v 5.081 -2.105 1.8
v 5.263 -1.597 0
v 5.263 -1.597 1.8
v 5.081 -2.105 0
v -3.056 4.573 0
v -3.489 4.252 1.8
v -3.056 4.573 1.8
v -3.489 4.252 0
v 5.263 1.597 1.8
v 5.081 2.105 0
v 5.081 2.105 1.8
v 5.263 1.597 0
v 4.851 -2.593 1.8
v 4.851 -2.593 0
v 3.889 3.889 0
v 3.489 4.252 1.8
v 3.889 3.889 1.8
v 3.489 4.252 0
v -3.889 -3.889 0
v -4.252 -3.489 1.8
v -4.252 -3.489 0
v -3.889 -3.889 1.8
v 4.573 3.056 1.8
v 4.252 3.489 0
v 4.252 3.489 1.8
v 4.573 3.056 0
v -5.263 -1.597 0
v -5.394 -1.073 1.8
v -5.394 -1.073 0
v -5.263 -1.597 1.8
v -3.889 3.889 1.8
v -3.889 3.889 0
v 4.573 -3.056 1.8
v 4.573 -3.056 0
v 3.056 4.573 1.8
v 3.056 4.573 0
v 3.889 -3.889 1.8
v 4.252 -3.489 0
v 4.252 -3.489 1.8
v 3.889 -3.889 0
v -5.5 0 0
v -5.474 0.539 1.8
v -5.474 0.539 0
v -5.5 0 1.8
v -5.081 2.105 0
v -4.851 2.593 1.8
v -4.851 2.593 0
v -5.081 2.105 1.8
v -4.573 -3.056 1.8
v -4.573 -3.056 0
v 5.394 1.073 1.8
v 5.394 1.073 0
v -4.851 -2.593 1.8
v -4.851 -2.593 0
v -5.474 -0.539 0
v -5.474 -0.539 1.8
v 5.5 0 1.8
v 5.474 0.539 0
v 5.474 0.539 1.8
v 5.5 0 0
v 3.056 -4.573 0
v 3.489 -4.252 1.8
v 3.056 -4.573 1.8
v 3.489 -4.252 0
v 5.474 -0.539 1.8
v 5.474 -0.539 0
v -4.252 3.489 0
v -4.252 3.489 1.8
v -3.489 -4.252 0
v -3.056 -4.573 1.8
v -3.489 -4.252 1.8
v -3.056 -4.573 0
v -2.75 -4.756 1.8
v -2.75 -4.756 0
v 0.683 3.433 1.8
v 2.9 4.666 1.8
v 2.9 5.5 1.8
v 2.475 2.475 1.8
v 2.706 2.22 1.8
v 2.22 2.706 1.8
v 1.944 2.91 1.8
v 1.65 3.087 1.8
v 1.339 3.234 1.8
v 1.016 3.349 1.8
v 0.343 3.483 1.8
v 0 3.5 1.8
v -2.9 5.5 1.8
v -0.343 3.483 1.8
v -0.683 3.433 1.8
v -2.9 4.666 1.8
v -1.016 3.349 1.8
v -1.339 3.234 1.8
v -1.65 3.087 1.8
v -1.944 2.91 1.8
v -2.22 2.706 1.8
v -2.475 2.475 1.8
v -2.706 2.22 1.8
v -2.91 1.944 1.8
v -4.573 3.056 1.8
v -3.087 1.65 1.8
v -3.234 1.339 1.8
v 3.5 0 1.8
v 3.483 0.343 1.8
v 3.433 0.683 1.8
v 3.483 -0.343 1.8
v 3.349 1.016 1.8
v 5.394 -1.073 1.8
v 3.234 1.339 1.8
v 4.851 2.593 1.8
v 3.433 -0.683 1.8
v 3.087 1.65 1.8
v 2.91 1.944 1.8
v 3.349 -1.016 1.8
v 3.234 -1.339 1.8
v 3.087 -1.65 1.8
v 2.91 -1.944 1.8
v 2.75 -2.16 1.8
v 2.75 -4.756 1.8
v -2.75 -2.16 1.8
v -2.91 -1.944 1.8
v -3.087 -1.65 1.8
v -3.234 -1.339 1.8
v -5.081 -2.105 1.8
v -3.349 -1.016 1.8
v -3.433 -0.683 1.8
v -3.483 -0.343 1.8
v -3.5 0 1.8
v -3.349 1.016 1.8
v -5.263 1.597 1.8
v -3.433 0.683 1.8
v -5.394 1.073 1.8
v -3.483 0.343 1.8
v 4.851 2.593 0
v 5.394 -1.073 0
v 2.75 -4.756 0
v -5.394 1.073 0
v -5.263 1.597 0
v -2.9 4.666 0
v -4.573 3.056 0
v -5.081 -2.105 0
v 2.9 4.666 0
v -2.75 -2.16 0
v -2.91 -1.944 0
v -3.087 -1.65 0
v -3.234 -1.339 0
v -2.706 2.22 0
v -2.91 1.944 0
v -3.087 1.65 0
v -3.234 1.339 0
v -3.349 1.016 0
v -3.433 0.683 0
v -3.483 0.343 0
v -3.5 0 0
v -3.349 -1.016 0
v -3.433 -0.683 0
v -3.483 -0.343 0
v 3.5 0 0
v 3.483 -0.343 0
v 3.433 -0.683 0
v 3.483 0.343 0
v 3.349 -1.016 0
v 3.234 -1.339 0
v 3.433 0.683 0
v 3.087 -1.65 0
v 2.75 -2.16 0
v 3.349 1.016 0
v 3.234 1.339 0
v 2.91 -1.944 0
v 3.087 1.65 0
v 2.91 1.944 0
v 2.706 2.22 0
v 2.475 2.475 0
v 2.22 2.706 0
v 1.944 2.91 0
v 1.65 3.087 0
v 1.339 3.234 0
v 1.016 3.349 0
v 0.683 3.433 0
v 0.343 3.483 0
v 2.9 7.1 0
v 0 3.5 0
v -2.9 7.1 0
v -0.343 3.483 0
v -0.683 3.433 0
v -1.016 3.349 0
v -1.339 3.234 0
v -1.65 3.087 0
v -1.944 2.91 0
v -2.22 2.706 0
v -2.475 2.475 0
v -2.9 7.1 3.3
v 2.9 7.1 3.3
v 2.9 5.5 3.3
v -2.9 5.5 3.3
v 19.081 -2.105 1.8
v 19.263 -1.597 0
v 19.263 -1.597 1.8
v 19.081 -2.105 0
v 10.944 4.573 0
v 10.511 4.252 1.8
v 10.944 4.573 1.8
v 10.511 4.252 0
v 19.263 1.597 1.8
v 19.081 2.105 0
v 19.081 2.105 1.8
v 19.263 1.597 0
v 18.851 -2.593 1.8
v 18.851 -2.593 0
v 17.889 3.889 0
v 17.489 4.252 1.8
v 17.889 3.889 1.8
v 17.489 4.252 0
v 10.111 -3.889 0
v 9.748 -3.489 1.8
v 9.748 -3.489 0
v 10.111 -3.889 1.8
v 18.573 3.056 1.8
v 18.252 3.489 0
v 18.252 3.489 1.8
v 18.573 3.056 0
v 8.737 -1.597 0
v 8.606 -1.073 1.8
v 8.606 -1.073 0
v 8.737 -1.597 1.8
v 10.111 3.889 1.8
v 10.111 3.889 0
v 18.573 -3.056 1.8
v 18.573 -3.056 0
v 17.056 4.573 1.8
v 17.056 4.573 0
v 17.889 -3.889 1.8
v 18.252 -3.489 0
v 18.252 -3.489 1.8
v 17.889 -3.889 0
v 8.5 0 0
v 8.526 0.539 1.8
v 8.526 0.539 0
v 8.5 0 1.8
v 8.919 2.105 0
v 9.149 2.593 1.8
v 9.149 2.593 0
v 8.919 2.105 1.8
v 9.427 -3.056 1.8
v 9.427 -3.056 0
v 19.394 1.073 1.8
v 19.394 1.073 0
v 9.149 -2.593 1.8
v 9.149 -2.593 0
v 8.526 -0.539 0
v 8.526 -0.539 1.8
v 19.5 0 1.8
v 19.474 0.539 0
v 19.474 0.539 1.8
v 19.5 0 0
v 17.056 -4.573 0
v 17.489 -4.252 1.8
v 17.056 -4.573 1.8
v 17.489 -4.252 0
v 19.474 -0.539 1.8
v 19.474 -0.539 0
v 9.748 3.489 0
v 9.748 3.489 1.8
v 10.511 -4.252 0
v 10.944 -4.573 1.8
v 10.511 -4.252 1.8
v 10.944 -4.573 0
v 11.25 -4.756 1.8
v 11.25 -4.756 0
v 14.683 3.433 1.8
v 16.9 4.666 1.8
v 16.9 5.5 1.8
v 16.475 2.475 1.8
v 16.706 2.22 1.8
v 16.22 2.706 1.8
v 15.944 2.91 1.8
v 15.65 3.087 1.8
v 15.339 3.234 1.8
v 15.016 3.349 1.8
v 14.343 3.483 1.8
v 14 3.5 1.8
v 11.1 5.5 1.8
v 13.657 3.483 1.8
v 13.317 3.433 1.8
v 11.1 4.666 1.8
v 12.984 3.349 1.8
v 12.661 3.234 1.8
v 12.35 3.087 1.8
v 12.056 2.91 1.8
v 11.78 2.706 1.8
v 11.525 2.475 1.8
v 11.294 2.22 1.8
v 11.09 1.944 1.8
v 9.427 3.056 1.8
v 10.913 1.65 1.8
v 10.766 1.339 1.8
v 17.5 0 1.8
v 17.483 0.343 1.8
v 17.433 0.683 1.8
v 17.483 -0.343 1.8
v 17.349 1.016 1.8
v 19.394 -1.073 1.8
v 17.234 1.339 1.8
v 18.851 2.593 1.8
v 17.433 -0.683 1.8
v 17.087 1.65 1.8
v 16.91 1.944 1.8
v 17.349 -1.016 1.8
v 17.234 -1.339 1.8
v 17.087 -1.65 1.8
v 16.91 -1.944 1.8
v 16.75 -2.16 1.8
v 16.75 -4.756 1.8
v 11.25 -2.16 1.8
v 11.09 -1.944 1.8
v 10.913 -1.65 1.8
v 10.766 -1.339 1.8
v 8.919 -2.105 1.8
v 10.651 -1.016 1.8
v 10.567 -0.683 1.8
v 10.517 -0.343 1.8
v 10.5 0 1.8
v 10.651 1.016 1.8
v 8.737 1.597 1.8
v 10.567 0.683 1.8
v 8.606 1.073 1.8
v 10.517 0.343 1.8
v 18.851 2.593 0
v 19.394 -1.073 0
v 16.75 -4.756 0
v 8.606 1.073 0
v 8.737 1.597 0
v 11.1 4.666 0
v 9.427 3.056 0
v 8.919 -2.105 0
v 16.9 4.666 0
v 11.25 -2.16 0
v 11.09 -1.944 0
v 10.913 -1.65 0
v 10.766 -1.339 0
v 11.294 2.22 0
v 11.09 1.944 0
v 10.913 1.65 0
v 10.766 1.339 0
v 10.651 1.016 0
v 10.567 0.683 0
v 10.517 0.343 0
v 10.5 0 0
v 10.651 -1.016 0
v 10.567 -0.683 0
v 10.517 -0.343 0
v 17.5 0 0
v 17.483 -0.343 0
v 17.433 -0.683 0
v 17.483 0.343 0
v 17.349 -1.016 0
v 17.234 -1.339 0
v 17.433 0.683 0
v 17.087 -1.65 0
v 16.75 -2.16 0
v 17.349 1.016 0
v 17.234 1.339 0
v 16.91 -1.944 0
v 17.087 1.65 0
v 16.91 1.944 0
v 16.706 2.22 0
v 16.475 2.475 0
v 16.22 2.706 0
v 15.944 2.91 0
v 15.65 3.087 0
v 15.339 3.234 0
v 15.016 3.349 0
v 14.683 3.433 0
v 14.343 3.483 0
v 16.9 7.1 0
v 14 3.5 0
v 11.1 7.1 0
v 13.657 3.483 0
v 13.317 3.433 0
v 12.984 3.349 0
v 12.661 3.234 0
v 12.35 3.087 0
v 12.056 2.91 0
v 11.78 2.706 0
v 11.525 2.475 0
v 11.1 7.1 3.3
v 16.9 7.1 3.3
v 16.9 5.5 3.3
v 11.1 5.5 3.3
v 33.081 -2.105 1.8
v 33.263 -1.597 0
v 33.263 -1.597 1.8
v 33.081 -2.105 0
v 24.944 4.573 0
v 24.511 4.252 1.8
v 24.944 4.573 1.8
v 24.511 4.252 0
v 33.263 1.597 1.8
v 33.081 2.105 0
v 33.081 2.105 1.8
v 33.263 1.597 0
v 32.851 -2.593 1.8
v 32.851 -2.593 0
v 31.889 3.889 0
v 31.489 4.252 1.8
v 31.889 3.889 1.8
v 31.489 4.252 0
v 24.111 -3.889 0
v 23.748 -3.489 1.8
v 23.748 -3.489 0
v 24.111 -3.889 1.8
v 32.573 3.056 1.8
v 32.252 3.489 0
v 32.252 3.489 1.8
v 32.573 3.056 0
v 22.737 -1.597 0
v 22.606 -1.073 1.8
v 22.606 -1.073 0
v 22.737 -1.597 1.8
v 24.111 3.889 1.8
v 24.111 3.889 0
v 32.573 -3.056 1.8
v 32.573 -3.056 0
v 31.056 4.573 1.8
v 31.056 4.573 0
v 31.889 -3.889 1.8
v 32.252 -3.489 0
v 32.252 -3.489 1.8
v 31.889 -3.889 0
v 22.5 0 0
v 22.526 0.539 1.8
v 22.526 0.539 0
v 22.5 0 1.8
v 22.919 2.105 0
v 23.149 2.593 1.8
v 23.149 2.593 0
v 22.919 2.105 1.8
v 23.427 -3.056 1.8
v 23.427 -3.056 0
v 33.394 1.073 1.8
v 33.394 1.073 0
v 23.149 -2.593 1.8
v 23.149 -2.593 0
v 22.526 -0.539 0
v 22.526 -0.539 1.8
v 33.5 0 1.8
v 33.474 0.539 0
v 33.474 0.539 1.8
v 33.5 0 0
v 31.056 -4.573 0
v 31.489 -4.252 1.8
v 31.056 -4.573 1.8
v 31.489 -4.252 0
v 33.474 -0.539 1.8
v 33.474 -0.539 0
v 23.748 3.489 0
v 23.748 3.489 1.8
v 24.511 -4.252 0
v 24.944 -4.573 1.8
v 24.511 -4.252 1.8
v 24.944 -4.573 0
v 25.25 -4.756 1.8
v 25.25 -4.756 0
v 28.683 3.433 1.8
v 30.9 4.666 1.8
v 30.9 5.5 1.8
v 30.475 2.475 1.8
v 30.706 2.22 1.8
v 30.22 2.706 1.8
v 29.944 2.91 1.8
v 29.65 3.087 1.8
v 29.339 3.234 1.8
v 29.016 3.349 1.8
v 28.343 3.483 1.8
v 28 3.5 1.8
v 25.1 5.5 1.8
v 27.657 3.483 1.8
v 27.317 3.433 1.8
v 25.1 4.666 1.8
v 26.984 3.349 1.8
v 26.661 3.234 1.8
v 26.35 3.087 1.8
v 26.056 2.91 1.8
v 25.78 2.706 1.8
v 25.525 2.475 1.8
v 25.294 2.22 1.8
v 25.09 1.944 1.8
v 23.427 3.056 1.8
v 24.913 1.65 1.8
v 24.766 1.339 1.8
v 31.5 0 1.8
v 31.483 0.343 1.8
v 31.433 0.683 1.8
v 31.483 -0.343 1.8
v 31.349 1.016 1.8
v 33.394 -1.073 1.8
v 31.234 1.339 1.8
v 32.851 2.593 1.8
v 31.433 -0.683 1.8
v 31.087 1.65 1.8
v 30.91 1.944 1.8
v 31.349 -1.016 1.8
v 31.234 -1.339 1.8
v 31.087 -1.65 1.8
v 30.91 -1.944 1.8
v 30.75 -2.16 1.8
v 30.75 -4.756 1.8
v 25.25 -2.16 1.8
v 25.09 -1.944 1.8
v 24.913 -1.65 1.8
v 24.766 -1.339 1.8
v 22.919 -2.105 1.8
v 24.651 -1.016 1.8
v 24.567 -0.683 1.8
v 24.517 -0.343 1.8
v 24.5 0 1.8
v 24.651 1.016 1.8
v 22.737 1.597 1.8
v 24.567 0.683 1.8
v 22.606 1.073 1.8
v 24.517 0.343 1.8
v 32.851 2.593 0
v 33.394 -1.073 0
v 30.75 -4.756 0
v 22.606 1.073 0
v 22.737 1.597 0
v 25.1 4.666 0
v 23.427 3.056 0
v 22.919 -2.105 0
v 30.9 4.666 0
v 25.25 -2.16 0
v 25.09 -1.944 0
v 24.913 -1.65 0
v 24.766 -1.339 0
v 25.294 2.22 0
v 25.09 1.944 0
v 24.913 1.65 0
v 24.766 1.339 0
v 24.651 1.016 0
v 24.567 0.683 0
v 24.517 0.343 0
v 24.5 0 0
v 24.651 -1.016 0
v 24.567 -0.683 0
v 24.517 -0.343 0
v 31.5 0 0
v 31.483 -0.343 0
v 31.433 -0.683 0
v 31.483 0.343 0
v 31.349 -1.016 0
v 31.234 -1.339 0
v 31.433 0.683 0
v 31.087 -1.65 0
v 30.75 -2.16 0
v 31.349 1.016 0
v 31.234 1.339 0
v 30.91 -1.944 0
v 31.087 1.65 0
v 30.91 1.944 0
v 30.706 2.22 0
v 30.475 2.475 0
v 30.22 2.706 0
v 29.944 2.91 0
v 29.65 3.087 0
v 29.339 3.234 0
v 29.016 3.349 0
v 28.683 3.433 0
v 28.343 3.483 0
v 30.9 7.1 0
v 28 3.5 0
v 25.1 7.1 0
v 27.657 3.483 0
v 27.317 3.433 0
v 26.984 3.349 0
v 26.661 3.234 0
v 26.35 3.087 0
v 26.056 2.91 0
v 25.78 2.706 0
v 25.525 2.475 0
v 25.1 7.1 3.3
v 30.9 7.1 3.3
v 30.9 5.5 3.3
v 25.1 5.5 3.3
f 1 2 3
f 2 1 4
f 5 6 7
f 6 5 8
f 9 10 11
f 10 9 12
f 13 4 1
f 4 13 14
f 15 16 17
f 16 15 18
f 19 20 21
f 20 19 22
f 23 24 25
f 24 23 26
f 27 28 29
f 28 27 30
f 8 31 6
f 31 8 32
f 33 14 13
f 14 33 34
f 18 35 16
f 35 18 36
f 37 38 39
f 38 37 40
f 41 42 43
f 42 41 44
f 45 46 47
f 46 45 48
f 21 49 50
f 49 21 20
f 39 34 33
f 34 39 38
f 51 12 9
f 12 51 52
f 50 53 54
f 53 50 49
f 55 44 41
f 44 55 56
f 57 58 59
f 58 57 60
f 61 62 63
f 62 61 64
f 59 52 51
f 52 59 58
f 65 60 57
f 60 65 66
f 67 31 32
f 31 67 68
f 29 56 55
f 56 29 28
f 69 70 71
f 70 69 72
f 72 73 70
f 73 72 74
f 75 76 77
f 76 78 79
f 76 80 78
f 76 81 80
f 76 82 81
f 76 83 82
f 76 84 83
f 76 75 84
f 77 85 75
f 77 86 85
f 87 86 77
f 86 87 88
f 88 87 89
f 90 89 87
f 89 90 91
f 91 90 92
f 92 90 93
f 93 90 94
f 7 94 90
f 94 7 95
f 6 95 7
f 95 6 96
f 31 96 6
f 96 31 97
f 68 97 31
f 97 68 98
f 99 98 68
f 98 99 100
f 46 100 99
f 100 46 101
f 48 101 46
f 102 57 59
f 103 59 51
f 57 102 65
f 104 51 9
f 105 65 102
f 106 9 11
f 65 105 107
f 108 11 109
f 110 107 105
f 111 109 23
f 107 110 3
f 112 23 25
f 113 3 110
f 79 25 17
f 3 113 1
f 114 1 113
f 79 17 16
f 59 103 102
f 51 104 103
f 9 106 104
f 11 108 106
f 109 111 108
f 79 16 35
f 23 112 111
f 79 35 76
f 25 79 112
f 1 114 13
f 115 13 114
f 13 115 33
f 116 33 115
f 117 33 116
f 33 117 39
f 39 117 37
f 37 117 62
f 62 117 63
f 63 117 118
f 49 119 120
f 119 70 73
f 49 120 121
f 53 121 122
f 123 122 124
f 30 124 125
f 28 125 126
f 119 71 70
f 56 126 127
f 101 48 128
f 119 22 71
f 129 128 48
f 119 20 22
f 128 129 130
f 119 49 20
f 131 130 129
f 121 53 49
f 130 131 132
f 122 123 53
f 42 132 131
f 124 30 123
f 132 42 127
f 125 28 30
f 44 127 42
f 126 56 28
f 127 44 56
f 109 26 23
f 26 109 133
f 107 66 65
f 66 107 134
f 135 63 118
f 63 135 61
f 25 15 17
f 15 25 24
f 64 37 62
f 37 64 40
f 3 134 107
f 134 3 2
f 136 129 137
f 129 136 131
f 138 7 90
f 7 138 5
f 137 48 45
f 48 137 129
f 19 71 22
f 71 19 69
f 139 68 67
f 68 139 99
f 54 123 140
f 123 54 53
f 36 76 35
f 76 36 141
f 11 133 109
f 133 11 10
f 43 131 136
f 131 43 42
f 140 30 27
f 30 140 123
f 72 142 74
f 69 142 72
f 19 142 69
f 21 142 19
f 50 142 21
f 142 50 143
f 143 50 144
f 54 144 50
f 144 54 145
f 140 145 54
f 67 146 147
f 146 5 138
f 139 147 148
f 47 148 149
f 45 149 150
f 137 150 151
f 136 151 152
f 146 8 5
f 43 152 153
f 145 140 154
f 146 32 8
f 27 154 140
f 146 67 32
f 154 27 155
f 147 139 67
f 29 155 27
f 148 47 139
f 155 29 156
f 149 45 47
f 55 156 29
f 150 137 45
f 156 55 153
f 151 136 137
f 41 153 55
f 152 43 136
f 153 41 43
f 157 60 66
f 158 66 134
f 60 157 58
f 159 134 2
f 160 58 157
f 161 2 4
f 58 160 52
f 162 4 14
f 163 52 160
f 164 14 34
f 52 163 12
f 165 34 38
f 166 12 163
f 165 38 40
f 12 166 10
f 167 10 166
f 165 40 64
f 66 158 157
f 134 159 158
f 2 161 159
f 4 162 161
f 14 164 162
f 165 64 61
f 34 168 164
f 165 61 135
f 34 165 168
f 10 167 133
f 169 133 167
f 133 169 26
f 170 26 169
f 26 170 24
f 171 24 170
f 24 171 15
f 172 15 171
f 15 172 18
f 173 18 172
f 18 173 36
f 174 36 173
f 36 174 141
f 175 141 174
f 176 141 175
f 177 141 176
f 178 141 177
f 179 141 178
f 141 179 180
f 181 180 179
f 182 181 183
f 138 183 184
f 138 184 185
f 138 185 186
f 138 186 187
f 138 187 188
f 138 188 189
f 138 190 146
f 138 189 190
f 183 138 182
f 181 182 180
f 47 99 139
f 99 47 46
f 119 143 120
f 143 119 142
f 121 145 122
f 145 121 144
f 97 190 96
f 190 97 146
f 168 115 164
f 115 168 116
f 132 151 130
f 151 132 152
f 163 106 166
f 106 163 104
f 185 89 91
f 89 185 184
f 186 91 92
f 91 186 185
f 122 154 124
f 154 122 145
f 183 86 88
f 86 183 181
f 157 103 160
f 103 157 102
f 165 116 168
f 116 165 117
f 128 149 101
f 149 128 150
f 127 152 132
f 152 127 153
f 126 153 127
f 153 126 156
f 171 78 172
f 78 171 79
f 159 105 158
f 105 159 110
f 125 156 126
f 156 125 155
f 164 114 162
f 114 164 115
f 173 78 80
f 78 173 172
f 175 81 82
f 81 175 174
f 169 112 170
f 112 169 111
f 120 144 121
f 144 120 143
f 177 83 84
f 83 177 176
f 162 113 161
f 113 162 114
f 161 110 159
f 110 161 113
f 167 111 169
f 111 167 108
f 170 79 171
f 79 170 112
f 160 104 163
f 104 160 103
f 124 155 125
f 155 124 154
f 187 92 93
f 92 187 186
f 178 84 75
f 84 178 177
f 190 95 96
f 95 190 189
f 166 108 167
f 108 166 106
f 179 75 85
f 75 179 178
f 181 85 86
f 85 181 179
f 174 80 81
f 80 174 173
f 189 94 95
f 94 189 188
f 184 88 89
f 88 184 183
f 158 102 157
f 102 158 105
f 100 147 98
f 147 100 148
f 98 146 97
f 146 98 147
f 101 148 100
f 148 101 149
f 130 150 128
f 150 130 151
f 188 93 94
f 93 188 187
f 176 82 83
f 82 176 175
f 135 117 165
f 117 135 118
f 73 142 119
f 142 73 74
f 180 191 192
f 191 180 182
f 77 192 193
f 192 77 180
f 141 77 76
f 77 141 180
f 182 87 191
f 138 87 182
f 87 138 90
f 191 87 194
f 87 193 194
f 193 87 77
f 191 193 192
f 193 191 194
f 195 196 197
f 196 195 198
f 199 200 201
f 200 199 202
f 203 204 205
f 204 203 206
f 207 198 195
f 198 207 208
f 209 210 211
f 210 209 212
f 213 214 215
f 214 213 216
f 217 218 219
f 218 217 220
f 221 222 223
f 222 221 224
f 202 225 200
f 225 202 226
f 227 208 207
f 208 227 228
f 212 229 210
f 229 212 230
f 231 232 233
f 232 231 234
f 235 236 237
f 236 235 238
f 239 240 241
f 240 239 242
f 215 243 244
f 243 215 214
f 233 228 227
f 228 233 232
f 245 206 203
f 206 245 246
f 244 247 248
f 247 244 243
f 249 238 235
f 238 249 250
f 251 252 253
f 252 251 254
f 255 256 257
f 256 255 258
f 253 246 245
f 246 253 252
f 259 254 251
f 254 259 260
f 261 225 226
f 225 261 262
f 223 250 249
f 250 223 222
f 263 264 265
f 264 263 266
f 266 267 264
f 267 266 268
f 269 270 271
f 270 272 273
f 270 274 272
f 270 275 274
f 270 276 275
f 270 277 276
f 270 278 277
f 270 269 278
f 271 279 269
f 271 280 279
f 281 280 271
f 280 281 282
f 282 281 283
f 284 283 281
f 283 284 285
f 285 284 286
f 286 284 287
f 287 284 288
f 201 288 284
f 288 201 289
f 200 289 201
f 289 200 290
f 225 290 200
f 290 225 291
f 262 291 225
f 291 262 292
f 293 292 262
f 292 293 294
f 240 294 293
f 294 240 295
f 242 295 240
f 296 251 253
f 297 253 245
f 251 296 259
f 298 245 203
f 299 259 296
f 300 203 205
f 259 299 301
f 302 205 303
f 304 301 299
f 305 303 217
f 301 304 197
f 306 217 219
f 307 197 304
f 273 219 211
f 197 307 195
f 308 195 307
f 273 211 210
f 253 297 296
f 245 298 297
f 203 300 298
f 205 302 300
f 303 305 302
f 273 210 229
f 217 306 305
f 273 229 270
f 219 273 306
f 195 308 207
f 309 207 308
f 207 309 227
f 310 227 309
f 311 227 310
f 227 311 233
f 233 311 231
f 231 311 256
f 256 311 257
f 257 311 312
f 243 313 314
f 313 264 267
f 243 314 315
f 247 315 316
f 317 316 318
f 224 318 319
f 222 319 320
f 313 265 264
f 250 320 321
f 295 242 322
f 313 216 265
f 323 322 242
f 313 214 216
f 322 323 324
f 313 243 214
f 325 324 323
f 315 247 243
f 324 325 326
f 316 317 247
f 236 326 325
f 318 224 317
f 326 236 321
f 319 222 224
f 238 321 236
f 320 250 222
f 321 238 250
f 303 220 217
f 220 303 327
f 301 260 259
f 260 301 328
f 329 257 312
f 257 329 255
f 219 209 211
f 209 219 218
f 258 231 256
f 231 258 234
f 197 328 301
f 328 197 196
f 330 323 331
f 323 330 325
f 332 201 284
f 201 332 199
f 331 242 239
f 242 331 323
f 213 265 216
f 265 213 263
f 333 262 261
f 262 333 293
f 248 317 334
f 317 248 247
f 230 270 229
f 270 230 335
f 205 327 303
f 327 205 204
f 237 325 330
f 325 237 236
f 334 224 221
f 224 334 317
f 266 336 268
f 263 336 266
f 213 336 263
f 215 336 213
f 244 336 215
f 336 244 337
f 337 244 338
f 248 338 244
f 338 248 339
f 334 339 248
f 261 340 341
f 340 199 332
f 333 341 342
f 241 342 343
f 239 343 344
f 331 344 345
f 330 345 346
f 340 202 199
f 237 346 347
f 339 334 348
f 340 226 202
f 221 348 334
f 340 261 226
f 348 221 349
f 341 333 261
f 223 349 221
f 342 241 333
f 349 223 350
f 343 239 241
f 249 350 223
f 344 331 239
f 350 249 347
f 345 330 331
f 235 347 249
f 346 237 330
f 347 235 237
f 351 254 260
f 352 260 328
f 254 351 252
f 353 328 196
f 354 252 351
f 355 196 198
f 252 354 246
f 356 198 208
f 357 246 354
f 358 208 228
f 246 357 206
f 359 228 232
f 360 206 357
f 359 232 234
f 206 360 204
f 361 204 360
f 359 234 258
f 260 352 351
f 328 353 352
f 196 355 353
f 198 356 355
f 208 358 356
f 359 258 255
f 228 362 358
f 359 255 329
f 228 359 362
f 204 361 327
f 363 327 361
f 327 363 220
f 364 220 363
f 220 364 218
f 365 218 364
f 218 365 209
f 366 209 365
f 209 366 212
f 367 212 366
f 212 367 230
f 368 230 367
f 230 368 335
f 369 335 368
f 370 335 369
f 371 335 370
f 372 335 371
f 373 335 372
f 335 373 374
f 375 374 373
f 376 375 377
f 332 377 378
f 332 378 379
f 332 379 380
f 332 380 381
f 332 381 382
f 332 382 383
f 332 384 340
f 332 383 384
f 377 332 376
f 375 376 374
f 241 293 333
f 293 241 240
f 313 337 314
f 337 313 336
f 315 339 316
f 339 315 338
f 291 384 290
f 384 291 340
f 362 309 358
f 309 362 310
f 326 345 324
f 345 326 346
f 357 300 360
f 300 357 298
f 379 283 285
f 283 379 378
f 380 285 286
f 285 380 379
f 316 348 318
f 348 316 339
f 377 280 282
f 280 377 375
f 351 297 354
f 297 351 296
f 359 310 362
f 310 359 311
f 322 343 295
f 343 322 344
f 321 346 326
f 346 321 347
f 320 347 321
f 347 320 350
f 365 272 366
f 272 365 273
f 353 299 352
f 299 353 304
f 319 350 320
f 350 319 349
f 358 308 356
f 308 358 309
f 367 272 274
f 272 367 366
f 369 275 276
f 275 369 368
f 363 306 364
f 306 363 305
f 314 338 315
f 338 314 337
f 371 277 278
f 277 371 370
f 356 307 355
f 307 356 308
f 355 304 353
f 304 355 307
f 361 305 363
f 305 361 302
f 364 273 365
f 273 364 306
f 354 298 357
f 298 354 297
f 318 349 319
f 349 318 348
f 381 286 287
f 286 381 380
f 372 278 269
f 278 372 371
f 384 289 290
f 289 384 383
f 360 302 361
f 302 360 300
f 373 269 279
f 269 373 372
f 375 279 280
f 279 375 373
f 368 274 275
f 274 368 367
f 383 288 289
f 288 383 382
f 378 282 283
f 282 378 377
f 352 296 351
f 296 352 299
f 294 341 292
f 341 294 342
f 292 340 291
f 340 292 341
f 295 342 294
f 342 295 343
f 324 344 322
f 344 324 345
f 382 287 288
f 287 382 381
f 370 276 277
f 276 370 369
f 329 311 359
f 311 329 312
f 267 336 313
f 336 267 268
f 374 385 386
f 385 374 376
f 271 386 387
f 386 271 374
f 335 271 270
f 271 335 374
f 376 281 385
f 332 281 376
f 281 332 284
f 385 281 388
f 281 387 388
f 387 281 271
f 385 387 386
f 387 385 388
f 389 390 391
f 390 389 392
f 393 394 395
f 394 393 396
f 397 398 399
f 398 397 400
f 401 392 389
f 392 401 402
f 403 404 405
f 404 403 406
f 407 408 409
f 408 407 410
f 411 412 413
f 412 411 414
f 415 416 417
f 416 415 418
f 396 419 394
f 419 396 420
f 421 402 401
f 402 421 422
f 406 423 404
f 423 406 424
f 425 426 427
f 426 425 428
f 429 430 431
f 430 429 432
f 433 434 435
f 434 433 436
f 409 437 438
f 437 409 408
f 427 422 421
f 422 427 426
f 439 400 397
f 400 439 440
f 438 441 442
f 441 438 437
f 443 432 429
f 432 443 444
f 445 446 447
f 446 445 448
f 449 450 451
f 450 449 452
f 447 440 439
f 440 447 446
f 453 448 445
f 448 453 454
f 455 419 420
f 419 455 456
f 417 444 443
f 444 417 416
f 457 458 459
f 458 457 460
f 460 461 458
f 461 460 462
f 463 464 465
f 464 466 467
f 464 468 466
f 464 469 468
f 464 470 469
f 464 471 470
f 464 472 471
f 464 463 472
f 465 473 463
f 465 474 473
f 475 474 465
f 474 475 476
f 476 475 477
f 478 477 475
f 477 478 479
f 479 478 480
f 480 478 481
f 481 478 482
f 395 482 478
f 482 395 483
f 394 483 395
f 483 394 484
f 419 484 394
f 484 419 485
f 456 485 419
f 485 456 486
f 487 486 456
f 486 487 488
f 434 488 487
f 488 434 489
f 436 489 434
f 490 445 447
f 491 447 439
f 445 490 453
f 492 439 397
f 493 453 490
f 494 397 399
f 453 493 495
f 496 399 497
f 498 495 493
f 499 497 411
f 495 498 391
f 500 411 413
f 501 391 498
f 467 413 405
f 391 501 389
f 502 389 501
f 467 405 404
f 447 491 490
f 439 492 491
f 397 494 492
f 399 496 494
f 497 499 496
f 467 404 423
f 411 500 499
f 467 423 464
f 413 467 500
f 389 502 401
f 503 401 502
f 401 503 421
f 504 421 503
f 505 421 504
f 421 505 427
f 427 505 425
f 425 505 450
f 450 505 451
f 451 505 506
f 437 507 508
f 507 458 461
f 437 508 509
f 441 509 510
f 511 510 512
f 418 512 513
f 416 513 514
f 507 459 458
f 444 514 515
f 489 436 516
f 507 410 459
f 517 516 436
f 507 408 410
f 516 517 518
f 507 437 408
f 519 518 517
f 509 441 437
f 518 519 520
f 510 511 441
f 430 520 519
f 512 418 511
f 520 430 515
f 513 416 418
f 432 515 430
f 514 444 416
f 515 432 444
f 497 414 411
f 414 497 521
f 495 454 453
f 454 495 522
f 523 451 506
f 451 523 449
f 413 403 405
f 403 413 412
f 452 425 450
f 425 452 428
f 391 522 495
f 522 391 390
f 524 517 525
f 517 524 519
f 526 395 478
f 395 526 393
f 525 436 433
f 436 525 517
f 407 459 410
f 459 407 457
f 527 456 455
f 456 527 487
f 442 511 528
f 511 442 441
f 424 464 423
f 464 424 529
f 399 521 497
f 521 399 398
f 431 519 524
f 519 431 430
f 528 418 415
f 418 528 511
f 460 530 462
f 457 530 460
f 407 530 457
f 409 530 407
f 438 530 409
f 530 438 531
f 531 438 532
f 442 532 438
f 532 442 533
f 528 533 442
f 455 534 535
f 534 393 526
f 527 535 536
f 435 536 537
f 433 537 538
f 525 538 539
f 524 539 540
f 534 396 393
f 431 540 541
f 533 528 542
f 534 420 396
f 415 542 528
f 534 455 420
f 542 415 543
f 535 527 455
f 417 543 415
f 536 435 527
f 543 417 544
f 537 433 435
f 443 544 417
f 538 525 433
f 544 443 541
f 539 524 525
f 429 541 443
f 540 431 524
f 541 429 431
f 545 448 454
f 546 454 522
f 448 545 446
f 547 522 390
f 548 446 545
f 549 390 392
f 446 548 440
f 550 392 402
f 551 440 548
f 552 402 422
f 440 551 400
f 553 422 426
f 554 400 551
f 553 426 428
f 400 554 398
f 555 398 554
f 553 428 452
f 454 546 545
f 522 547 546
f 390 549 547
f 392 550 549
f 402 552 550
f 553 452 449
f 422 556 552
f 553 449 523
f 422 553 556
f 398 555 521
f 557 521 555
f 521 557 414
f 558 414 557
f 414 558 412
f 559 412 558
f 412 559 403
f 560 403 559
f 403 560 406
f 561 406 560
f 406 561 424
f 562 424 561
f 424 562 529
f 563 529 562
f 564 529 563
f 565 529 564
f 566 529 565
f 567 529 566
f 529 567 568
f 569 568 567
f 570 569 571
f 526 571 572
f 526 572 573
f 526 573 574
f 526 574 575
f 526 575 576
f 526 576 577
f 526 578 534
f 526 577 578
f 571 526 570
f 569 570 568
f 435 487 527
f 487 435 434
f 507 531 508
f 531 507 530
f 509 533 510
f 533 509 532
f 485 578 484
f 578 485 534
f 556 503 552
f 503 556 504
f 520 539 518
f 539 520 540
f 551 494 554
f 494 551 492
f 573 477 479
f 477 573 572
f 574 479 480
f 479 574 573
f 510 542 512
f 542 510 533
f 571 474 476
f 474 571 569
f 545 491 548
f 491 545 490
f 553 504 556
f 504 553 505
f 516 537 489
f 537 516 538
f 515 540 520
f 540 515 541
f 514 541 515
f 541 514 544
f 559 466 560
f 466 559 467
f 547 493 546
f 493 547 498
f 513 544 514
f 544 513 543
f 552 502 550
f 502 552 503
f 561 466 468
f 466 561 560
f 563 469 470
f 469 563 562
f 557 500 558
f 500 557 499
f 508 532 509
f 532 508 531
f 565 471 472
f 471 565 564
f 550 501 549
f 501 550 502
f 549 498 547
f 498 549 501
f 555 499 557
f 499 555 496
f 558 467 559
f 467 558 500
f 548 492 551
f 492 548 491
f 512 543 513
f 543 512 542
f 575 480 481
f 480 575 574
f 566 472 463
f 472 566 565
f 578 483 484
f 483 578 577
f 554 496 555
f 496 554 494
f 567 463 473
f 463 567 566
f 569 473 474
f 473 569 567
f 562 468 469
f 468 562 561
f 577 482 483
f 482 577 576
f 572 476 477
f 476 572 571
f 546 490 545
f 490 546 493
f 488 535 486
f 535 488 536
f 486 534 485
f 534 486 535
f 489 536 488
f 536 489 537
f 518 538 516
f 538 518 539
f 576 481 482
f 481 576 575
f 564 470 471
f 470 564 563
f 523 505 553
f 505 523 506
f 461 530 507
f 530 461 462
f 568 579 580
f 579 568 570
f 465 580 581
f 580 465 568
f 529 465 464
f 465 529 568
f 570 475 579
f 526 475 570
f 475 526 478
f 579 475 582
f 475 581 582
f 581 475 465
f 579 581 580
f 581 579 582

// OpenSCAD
// 3D printer Bowden clip customizer.

// How many clips to print.
count = 3;
// Clip's thickness
ring_thickness = 1.8;
// Inner diameter of the clip
ring_id = 7;
// Outer diameter of the clip
ring_od = 11;
// Width of the clip's opening
ring_cut_width = 5.5;
// Width of the vertical tab.
tab_width = 5.8;
// Height of the vertical tab.
tab_height = 1.5;
// Thickness of the vertical tab.
tab_thickness = 1.6;
// Controls the distance between the vertical tab and the ring.. 
tab_offset = 0;


/* [Hidden] */

$fn = 64;
eps = 0.01;

module bowden_clip_tab() {
  ring_width = (ring_od - ring_id)/2;
  base_length = ring_width + tab_offset + tab_thickness;
  translate([-base_length-ring_id/2, -tab_width/2, 0]) 
    cube([base_length, tab_width, ring_thickness]);
  translate([-ring_od/2-tab_offset-tab_thickness, -tab_width/2, 0])
    cube([tab_thickness, tab_width, ring_thickness+tab_height]);
  
}

module bowden_clip_ring() {
  difference() {
    cylinder(d=ring_od, h=ring_thickness);
    translate([0, 0, -eps]) 
      cylinder(d=ring_id, h=ring_thickness+2*eps);
    translate([0, -ring_cut_width/2, -eps]) 
      cube([ring_od/2+eps, ring_cut_width, ring_thickness+2*eps]);
  }
}

module bowden_clip() {
  bowden_clip_ring();
  bowden_clip_tab();
}

for (i = [0 : count-1]) {
  translate([i*(ring_od + 3), 0, 0]) rotate([0, 0, -90]) bowden_clip(); 
}
